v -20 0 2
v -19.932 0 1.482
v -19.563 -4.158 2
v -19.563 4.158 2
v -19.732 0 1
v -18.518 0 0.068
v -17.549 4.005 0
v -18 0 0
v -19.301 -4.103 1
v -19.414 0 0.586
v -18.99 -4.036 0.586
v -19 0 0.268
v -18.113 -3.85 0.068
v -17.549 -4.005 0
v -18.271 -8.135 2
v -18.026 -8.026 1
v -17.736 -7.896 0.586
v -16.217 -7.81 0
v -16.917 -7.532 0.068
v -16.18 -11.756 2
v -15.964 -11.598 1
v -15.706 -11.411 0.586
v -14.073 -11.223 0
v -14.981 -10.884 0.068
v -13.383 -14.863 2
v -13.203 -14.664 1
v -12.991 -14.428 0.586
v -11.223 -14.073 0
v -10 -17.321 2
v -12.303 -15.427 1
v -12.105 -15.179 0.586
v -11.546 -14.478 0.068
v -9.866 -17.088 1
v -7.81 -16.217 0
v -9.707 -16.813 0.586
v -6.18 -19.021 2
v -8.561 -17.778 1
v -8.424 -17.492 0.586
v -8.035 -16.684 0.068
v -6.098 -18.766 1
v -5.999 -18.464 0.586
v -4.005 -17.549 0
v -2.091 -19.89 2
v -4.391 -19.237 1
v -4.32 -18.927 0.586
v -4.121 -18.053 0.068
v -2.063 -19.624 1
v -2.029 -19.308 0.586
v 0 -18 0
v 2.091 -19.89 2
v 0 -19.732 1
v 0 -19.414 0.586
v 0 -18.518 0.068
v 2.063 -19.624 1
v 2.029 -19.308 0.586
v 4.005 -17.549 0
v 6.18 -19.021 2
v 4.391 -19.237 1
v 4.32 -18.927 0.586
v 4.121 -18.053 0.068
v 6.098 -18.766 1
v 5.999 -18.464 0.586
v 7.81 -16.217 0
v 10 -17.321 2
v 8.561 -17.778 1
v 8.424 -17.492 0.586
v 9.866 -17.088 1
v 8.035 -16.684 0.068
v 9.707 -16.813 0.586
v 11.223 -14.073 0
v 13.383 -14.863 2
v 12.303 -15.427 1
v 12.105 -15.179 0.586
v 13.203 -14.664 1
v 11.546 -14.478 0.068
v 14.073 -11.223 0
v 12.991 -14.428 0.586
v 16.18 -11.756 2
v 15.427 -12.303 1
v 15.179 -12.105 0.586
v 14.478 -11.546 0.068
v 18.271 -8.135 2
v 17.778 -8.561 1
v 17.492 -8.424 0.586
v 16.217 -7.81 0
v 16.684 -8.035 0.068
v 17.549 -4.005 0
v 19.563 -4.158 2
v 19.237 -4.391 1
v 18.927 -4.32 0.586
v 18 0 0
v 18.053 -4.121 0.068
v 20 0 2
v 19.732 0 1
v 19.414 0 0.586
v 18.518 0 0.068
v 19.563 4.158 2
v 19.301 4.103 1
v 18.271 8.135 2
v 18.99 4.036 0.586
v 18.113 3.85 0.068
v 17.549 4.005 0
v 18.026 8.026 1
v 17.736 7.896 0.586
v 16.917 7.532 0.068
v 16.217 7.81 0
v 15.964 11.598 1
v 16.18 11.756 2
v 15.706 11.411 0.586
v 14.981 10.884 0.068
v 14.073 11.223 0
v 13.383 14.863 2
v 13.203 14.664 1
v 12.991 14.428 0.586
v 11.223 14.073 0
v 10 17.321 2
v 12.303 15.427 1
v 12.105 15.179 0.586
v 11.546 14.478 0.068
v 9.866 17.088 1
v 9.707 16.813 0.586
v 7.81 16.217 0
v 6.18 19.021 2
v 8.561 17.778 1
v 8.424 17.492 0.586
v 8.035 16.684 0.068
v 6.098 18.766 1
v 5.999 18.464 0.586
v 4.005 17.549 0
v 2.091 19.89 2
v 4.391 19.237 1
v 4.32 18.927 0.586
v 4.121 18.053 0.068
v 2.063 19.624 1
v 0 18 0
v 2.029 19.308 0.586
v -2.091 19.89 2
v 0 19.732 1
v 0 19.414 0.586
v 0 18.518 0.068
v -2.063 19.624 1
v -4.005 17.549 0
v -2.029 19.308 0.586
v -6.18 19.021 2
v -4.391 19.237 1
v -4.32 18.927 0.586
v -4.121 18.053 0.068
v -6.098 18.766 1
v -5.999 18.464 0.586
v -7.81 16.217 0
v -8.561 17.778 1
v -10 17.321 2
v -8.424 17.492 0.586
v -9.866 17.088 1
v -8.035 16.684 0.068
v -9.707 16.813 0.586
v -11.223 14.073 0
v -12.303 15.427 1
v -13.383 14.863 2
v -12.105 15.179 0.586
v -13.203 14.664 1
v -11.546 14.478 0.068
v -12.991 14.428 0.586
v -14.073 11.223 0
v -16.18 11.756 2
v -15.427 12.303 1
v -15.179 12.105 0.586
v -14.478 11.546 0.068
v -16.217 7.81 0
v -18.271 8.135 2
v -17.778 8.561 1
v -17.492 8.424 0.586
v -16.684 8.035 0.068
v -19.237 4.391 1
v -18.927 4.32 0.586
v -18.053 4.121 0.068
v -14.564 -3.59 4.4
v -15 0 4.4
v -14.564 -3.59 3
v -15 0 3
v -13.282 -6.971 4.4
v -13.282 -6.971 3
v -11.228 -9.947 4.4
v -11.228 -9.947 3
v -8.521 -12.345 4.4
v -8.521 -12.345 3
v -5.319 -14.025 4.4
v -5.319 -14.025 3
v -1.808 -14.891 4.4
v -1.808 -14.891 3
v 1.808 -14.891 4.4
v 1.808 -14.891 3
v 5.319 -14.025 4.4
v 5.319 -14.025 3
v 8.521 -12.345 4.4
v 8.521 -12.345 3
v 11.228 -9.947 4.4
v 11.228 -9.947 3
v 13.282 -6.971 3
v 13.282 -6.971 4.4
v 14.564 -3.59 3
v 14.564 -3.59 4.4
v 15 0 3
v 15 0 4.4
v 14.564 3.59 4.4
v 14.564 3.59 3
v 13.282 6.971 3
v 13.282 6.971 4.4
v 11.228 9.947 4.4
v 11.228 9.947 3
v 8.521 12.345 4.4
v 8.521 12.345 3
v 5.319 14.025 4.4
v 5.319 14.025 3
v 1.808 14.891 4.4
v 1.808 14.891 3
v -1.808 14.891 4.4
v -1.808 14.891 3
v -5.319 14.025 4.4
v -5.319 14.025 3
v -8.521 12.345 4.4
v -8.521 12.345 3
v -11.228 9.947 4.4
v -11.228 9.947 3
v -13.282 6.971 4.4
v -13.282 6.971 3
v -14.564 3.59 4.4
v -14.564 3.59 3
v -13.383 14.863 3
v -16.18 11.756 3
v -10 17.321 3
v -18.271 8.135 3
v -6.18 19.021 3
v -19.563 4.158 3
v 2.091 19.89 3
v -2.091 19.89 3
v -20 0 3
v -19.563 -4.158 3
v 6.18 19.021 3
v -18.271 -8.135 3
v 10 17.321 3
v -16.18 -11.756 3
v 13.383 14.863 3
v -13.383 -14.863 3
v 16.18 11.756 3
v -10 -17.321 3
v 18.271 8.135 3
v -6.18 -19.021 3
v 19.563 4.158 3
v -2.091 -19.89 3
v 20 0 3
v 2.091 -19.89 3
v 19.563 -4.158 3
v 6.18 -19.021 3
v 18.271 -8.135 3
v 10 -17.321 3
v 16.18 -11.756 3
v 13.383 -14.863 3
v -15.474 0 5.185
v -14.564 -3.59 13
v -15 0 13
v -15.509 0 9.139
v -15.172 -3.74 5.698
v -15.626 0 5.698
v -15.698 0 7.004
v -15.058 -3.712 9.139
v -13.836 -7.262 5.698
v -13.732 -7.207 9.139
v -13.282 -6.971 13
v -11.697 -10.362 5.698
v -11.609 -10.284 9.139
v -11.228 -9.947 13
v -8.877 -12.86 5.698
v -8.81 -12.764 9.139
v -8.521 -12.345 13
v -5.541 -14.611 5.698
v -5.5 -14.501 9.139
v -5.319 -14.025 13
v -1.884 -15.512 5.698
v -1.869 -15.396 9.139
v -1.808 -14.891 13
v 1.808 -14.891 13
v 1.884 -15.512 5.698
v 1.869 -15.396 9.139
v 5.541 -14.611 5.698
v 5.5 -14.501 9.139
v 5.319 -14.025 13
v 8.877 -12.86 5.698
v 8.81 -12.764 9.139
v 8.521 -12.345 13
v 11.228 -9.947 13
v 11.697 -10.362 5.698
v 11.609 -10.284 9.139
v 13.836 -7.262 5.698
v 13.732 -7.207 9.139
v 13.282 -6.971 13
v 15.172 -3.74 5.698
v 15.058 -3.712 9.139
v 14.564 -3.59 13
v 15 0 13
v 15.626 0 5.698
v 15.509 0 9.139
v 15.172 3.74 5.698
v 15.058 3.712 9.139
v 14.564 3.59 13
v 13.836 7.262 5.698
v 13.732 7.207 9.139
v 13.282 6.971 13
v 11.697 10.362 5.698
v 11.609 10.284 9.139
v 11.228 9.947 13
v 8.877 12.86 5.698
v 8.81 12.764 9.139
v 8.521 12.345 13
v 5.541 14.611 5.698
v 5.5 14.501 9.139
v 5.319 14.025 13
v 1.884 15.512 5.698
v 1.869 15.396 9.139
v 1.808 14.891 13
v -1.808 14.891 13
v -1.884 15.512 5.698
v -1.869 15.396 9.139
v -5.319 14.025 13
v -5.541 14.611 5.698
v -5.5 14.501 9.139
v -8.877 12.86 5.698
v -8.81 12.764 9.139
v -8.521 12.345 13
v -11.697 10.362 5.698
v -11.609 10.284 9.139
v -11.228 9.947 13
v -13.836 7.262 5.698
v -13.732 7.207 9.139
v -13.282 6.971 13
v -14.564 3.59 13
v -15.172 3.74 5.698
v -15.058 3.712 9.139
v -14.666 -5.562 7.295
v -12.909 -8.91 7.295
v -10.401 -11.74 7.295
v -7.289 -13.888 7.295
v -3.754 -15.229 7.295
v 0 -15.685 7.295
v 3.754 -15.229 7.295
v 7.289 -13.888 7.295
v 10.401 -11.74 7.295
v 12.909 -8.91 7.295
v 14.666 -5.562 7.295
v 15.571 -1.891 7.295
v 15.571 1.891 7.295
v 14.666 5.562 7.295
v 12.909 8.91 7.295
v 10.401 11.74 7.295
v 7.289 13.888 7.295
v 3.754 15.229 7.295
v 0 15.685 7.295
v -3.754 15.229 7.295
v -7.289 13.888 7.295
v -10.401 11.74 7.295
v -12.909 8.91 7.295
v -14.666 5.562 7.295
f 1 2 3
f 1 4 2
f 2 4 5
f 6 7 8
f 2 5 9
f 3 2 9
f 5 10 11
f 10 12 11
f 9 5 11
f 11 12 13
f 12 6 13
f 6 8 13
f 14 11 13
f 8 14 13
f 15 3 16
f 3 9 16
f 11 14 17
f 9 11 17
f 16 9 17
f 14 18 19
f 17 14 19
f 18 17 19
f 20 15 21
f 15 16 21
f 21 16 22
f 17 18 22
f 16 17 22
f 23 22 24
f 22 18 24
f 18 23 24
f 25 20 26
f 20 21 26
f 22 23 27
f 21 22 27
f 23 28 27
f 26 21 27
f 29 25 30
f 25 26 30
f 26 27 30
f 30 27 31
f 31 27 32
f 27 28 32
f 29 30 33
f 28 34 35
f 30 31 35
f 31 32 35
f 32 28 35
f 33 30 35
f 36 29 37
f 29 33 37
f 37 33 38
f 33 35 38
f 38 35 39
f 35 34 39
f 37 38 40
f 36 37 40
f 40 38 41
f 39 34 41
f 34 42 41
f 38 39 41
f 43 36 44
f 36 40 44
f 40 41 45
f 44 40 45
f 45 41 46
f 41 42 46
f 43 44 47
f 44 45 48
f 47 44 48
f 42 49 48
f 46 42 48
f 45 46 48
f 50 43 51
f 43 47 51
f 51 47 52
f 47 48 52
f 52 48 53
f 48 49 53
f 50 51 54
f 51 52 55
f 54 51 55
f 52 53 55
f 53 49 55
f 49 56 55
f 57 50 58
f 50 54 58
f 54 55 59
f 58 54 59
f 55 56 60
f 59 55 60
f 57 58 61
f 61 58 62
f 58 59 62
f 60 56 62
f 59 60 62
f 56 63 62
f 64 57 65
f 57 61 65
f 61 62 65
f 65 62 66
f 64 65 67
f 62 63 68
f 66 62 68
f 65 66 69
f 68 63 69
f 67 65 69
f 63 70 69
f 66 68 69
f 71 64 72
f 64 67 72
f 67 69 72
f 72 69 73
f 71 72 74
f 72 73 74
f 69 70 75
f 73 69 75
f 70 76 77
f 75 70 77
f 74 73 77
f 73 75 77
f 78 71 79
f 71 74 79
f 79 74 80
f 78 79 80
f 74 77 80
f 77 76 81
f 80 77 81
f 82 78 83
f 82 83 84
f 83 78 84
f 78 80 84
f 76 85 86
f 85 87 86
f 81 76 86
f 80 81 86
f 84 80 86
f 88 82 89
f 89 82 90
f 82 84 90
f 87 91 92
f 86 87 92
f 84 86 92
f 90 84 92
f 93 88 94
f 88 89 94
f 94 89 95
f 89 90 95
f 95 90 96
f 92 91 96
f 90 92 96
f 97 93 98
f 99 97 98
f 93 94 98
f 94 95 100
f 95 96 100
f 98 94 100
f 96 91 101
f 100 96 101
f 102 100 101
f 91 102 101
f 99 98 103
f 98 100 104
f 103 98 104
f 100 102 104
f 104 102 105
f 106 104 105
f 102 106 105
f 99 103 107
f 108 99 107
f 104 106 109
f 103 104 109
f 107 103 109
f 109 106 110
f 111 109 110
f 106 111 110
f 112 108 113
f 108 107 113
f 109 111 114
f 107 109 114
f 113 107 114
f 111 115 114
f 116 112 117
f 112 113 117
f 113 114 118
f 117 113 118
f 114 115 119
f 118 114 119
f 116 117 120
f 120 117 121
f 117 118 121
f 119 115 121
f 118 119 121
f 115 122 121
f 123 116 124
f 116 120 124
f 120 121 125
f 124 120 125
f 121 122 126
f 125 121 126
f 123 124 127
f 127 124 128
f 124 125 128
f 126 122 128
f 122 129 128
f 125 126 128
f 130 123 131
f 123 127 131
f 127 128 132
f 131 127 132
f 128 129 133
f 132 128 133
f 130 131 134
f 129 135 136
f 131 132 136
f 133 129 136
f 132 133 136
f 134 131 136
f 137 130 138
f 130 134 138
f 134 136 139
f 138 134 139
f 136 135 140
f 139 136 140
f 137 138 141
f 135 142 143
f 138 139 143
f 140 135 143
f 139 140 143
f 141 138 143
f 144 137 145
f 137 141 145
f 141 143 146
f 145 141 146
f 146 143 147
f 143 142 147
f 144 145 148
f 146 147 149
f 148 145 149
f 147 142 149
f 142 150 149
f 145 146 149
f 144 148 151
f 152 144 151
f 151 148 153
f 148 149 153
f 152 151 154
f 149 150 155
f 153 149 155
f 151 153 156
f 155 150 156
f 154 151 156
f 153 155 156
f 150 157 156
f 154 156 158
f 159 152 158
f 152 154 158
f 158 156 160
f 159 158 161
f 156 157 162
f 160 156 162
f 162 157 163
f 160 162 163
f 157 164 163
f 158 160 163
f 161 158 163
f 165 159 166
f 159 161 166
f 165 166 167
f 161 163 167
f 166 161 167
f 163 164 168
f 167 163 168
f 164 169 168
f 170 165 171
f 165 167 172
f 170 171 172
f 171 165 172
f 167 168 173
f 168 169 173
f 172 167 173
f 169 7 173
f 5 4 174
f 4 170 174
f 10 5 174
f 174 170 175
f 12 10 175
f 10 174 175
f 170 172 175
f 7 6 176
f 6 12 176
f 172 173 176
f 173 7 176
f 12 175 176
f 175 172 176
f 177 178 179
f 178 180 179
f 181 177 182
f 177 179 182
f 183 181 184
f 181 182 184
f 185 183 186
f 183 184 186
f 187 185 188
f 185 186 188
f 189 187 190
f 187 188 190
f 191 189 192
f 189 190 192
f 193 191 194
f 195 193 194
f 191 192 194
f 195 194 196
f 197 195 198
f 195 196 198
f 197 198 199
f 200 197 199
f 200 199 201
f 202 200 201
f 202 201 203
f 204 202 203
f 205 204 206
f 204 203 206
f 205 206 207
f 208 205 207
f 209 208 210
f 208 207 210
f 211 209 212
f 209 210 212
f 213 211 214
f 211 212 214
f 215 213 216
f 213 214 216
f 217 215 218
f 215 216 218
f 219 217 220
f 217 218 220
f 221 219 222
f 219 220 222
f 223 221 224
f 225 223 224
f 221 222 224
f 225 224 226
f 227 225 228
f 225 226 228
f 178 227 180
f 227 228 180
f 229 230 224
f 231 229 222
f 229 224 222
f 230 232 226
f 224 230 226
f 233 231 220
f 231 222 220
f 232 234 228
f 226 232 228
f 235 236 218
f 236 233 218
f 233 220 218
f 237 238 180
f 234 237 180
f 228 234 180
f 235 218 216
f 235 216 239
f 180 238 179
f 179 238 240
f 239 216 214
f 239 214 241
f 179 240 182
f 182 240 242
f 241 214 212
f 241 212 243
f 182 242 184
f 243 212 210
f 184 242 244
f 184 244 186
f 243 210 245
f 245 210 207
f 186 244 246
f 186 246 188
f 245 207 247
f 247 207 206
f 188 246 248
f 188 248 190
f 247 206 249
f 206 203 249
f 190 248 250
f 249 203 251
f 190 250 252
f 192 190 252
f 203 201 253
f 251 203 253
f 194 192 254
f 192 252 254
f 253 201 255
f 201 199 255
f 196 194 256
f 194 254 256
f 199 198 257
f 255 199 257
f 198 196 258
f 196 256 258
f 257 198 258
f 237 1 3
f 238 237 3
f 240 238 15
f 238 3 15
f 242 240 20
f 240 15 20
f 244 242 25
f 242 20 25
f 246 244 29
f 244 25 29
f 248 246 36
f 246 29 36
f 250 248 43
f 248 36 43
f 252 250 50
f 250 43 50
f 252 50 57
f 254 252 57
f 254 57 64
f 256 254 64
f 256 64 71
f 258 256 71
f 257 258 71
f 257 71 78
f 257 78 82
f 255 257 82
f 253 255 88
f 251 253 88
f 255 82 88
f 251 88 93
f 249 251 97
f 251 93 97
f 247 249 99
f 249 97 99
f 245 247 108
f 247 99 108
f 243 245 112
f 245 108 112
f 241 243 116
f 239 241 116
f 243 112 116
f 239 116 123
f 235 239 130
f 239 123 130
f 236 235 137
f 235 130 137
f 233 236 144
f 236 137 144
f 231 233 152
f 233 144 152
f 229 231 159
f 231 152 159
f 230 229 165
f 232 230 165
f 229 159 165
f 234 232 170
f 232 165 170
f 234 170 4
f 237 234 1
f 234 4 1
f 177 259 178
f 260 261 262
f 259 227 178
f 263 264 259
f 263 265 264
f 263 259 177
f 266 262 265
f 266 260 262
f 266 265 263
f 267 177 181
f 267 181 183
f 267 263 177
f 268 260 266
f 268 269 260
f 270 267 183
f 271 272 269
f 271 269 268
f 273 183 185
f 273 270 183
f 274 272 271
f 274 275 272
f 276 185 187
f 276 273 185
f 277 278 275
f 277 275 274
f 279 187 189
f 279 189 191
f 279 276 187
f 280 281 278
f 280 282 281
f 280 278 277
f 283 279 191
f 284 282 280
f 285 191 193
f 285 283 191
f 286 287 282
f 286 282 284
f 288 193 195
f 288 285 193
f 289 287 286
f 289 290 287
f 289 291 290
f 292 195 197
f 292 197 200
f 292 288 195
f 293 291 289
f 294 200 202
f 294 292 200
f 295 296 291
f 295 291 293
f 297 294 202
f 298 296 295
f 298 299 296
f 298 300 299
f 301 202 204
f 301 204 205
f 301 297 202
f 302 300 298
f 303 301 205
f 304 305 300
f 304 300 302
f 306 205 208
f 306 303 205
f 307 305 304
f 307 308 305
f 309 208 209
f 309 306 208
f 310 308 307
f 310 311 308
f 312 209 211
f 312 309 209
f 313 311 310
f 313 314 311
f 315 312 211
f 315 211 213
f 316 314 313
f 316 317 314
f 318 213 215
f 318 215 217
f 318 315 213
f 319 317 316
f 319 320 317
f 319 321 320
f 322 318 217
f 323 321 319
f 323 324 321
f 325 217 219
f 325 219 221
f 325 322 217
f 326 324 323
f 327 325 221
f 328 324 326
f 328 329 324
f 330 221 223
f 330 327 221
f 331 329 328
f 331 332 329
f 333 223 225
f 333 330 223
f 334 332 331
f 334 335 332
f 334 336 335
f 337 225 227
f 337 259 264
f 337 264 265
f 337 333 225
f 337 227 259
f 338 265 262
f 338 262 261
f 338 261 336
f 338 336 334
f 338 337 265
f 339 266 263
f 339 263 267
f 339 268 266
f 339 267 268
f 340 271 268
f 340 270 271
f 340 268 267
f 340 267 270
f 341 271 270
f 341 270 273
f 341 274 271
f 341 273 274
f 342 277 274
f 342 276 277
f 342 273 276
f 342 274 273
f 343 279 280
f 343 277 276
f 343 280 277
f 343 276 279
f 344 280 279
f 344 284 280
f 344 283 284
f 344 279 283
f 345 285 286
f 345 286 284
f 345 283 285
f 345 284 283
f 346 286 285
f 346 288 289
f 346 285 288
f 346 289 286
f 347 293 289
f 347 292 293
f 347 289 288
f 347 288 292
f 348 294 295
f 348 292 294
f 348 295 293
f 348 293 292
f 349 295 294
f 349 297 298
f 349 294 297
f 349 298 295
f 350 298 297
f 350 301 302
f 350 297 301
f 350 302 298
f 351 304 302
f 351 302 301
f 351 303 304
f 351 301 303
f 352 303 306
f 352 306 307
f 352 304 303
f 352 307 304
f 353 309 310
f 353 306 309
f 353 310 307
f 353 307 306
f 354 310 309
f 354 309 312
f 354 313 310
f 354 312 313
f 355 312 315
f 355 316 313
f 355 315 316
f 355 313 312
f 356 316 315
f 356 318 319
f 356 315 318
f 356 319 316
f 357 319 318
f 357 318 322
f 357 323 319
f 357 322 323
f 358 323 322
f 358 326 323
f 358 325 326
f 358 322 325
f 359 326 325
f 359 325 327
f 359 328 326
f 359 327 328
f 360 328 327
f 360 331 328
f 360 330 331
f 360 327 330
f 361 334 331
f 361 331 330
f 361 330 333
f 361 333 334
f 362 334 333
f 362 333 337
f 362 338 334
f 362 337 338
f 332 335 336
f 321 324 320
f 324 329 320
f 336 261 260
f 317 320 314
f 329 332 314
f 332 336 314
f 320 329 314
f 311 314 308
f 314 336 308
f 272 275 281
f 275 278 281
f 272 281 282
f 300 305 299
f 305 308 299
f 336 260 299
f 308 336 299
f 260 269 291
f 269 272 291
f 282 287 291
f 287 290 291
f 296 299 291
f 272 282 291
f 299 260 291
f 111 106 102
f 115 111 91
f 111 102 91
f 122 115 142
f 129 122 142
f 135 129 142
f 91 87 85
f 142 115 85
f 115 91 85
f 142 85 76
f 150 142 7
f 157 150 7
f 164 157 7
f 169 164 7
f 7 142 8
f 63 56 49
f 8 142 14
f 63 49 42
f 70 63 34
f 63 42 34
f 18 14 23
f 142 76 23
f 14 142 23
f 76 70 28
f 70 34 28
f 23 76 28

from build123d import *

# Parameters (mm, degrees)
F2_R = 2


with BuildPart() as f1:
    # F0 (on Front) → F1 (revolve)
    with BuildSketch(Plane.XZ):
        with BuildLine():
            Line((0, 0), (0, 13))
            Line((0, 13), (-15, 13))
            add(Edge.make_bspline(
                [(-15, 4.4), (-15.3208951929, 4.8144145235), (-15.874556015, 5.7854230523), (-15.5071685552, 9.2587013818), (-15.237569809, 11.3938553259), (-15, 13)],
                knots=[0, 0, 0, 0, 0.2460647385, 0.6014905212, 1, 1, 1, 1], degree=3))
            Line((-15, 4.4), (-15, 3))
            Line((-15, 3), (-20, 3))
            Line((-20, 3), (-20, 0))
            Line((-20, 0), (0, 0))
        make_face()
    revolve(axis=Axis((0, 0, 6.5), (0, 0, 1)))

    # F2
    f2_edges = [f1.edges().sort_by_distance(p)[0] for p in [
        (20, 0, 0),
    ]]
    fillet(f2_edges, radius=F2_R)


solid = f1.part
